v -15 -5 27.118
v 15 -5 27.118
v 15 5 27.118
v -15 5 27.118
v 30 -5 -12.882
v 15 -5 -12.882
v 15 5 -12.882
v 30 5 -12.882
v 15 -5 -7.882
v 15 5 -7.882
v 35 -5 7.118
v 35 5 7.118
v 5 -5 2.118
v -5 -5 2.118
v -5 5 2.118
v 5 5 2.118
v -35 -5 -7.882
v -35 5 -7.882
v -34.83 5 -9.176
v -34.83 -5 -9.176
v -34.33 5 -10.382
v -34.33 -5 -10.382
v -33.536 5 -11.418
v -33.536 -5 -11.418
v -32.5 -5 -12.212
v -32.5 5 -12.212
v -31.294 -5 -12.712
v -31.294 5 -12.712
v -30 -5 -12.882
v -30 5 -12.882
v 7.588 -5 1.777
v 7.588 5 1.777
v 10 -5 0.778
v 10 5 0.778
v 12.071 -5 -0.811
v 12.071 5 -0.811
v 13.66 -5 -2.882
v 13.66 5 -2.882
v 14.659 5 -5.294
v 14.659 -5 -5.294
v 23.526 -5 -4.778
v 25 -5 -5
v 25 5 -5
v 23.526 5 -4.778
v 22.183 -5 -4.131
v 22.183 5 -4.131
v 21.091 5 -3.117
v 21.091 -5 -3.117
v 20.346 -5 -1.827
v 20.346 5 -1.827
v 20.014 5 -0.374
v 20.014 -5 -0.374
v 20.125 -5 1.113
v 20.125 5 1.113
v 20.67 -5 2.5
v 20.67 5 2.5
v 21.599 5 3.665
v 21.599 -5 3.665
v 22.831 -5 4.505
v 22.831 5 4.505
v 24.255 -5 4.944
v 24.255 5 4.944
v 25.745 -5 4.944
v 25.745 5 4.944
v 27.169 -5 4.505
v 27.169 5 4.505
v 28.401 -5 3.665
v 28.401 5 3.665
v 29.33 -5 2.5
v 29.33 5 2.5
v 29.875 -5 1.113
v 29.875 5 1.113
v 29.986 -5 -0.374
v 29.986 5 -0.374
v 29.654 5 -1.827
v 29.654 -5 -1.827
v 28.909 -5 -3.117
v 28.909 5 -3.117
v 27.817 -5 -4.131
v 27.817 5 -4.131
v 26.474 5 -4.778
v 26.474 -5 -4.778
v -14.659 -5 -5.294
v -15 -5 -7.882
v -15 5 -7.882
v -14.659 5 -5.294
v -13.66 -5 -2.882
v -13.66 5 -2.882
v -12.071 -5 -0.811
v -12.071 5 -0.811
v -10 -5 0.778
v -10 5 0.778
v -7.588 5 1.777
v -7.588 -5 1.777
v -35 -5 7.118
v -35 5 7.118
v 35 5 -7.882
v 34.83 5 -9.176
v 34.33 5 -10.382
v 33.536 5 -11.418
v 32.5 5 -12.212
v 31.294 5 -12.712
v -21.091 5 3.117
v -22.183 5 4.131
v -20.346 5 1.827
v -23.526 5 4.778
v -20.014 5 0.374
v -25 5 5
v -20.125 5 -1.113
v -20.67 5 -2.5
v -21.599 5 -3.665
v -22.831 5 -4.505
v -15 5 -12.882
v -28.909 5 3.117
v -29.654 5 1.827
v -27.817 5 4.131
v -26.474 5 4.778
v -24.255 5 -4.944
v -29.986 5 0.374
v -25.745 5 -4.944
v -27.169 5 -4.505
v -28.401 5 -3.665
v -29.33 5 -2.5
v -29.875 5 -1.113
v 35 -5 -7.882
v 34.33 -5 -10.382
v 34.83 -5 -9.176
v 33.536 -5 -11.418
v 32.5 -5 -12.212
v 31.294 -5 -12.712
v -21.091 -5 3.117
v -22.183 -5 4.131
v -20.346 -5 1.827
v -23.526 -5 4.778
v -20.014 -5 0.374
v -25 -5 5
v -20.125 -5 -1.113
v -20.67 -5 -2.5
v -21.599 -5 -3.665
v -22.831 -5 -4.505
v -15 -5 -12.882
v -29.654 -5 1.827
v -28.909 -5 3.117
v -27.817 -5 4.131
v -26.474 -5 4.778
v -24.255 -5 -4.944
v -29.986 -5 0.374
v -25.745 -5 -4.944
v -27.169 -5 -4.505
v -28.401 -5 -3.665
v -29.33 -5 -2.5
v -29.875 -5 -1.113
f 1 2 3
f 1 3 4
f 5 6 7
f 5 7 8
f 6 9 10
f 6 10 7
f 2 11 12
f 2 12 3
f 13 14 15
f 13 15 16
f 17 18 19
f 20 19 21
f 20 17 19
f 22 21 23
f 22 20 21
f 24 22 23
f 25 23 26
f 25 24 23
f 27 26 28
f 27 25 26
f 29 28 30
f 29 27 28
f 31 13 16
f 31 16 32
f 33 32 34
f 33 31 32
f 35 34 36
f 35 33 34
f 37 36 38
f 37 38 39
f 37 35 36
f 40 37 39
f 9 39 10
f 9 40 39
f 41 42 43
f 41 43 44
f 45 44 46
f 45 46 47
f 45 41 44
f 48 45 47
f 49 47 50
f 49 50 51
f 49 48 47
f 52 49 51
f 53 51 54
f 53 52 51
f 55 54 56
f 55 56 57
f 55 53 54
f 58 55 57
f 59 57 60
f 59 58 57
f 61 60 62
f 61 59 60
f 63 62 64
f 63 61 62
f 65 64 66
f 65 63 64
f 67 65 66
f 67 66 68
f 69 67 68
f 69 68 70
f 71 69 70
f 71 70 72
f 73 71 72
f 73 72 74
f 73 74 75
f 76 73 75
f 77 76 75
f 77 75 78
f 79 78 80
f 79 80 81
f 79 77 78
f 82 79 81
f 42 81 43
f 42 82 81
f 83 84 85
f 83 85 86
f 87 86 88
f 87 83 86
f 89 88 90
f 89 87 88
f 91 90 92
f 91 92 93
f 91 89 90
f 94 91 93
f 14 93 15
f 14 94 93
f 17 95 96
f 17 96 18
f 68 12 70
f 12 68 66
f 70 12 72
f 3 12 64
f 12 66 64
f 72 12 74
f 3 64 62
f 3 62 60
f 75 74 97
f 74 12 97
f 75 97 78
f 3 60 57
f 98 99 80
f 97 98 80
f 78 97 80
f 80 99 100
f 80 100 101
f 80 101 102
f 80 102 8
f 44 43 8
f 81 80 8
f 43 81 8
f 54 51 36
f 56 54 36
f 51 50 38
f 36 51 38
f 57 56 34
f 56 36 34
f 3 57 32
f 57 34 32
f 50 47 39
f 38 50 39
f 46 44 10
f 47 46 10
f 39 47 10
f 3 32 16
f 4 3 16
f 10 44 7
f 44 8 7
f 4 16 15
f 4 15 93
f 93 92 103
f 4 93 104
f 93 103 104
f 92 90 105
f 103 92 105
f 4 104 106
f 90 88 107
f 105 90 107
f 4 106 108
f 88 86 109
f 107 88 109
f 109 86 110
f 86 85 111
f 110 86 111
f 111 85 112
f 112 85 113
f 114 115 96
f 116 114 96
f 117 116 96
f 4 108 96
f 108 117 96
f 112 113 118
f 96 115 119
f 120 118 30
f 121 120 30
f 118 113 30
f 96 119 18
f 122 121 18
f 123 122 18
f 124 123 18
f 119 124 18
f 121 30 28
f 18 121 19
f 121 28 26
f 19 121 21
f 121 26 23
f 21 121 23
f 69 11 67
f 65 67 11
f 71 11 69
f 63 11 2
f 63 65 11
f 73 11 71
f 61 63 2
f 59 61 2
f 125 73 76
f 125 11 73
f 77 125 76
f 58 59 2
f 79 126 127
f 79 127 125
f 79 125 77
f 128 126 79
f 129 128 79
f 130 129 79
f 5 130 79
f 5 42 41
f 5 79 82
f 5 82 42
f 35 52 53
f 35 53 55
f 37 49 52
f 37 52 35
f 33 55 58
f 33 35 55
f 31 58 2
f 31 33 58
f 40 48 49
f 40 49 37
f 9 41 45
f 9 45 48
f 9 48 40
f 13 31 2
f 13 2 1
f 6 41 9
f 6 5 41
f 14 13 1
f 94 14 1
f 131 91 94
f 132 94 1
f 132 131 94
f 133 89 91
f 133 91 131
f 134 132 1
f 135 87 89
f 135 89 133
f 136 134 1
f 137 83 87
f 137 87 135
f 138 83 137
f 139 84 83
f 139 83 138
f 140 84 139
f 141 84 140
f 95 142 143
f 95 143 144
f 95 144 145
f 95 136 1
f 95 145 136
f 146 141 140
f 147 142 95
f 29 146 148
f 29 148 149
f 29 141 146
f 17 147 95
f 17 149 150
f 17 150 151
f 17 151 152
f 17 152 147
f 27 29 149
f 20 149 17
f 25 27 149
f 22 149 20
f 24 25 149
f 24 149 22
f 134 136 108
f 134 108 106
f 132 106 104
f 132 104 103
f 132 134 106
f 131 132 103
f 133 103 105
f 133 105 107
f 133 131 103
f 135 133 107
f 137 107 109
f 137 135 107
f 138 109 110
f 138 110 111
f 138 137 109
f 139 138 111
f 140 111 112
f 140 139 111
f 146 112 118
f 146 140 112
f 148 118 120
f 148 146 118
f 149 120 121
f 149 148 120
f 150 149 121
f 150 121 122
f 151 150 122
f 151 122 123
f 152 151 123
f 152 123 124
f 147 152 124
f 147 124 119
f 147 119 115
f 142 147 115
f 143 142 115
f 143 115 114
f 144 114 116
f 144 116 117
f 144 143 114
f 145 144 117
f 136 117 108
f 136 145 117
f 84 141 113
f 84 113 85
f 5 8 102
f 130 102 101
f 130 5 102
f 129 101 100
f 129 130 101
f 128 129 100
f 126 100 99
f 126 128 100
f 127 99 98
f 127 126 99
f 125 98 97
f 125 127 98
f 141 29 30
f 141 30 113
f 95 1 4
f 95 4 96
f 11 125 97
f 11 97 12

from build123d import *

# Parameters (mm, degrees)
BOSS_EXTRUDE2_DEPTH      = 5
BOSS_EXTRUDE2_DEPTH_BACK = 5
SKETCH1_R                = 5


with BuildPart() as part:
    # Sketch1 → Boss-Extrude2 (new, two sides: drawn at the far end of the back side and taken through both)
    with BuildSketch(Plane(origin=(0, 0, 0), x_dir=(1, 0, 0), z_dir=(0, 1, 0)).offset(-BOSS_EXTRUDE2_DEPTH_BACK)):
        with BuildLine():
            Line((-30, 12.882308015), (-15, 12.882308015))
            Line((-15, 12.882308015), (-15, 7.882308015))
            ThreePointArc((-15, 7.882308015), (-12.071067812, 0.811240203), (-5, -2.117691985))
            Line((-5, -2.117691985), (5, -2.117691985))
            ThreePointArc((5, -2.117691985), (12.071067812, 0.811240203), (15, 7.882308015))
            Line((15, 7.882308015), (15, 12.882308015))
            Line((15, 12.882308015), (30, 12.882308015))
            ThreePointArc((30, 12.882308015), (33.535533906, 11.417841921), (35, 7.882308015))
            Line((35, 7.882308015), (35, -7.117691985))
            Line((35, -7.117691985), (15, -27.117691985))
            Line((15, -27.117691985), (-15, -27.117691985))
            Line((-15, -27.117691985), (-35, -7.117691985))
            Line((-35, -7.117691985), (-35, 7.882308015))
            ThreePointArc((-35, 7.882308015), (-33.535533906, 11.417841921), (-30, 12.882308015))
        make_face()
        with Locations((-25, 0)):
            Circle(SKETCH1_R, mode=Mode.SUBTRACT)
        with Locations((25, 0)):
            Circle(SKETCH1_R, mode=Mode.SUBTRACT)
    extrude(amount=BOSS_EXTRUDE2_DEPTH + BOSS_EXTRUDE2_DEPTH_BACK)


solid = part.part
